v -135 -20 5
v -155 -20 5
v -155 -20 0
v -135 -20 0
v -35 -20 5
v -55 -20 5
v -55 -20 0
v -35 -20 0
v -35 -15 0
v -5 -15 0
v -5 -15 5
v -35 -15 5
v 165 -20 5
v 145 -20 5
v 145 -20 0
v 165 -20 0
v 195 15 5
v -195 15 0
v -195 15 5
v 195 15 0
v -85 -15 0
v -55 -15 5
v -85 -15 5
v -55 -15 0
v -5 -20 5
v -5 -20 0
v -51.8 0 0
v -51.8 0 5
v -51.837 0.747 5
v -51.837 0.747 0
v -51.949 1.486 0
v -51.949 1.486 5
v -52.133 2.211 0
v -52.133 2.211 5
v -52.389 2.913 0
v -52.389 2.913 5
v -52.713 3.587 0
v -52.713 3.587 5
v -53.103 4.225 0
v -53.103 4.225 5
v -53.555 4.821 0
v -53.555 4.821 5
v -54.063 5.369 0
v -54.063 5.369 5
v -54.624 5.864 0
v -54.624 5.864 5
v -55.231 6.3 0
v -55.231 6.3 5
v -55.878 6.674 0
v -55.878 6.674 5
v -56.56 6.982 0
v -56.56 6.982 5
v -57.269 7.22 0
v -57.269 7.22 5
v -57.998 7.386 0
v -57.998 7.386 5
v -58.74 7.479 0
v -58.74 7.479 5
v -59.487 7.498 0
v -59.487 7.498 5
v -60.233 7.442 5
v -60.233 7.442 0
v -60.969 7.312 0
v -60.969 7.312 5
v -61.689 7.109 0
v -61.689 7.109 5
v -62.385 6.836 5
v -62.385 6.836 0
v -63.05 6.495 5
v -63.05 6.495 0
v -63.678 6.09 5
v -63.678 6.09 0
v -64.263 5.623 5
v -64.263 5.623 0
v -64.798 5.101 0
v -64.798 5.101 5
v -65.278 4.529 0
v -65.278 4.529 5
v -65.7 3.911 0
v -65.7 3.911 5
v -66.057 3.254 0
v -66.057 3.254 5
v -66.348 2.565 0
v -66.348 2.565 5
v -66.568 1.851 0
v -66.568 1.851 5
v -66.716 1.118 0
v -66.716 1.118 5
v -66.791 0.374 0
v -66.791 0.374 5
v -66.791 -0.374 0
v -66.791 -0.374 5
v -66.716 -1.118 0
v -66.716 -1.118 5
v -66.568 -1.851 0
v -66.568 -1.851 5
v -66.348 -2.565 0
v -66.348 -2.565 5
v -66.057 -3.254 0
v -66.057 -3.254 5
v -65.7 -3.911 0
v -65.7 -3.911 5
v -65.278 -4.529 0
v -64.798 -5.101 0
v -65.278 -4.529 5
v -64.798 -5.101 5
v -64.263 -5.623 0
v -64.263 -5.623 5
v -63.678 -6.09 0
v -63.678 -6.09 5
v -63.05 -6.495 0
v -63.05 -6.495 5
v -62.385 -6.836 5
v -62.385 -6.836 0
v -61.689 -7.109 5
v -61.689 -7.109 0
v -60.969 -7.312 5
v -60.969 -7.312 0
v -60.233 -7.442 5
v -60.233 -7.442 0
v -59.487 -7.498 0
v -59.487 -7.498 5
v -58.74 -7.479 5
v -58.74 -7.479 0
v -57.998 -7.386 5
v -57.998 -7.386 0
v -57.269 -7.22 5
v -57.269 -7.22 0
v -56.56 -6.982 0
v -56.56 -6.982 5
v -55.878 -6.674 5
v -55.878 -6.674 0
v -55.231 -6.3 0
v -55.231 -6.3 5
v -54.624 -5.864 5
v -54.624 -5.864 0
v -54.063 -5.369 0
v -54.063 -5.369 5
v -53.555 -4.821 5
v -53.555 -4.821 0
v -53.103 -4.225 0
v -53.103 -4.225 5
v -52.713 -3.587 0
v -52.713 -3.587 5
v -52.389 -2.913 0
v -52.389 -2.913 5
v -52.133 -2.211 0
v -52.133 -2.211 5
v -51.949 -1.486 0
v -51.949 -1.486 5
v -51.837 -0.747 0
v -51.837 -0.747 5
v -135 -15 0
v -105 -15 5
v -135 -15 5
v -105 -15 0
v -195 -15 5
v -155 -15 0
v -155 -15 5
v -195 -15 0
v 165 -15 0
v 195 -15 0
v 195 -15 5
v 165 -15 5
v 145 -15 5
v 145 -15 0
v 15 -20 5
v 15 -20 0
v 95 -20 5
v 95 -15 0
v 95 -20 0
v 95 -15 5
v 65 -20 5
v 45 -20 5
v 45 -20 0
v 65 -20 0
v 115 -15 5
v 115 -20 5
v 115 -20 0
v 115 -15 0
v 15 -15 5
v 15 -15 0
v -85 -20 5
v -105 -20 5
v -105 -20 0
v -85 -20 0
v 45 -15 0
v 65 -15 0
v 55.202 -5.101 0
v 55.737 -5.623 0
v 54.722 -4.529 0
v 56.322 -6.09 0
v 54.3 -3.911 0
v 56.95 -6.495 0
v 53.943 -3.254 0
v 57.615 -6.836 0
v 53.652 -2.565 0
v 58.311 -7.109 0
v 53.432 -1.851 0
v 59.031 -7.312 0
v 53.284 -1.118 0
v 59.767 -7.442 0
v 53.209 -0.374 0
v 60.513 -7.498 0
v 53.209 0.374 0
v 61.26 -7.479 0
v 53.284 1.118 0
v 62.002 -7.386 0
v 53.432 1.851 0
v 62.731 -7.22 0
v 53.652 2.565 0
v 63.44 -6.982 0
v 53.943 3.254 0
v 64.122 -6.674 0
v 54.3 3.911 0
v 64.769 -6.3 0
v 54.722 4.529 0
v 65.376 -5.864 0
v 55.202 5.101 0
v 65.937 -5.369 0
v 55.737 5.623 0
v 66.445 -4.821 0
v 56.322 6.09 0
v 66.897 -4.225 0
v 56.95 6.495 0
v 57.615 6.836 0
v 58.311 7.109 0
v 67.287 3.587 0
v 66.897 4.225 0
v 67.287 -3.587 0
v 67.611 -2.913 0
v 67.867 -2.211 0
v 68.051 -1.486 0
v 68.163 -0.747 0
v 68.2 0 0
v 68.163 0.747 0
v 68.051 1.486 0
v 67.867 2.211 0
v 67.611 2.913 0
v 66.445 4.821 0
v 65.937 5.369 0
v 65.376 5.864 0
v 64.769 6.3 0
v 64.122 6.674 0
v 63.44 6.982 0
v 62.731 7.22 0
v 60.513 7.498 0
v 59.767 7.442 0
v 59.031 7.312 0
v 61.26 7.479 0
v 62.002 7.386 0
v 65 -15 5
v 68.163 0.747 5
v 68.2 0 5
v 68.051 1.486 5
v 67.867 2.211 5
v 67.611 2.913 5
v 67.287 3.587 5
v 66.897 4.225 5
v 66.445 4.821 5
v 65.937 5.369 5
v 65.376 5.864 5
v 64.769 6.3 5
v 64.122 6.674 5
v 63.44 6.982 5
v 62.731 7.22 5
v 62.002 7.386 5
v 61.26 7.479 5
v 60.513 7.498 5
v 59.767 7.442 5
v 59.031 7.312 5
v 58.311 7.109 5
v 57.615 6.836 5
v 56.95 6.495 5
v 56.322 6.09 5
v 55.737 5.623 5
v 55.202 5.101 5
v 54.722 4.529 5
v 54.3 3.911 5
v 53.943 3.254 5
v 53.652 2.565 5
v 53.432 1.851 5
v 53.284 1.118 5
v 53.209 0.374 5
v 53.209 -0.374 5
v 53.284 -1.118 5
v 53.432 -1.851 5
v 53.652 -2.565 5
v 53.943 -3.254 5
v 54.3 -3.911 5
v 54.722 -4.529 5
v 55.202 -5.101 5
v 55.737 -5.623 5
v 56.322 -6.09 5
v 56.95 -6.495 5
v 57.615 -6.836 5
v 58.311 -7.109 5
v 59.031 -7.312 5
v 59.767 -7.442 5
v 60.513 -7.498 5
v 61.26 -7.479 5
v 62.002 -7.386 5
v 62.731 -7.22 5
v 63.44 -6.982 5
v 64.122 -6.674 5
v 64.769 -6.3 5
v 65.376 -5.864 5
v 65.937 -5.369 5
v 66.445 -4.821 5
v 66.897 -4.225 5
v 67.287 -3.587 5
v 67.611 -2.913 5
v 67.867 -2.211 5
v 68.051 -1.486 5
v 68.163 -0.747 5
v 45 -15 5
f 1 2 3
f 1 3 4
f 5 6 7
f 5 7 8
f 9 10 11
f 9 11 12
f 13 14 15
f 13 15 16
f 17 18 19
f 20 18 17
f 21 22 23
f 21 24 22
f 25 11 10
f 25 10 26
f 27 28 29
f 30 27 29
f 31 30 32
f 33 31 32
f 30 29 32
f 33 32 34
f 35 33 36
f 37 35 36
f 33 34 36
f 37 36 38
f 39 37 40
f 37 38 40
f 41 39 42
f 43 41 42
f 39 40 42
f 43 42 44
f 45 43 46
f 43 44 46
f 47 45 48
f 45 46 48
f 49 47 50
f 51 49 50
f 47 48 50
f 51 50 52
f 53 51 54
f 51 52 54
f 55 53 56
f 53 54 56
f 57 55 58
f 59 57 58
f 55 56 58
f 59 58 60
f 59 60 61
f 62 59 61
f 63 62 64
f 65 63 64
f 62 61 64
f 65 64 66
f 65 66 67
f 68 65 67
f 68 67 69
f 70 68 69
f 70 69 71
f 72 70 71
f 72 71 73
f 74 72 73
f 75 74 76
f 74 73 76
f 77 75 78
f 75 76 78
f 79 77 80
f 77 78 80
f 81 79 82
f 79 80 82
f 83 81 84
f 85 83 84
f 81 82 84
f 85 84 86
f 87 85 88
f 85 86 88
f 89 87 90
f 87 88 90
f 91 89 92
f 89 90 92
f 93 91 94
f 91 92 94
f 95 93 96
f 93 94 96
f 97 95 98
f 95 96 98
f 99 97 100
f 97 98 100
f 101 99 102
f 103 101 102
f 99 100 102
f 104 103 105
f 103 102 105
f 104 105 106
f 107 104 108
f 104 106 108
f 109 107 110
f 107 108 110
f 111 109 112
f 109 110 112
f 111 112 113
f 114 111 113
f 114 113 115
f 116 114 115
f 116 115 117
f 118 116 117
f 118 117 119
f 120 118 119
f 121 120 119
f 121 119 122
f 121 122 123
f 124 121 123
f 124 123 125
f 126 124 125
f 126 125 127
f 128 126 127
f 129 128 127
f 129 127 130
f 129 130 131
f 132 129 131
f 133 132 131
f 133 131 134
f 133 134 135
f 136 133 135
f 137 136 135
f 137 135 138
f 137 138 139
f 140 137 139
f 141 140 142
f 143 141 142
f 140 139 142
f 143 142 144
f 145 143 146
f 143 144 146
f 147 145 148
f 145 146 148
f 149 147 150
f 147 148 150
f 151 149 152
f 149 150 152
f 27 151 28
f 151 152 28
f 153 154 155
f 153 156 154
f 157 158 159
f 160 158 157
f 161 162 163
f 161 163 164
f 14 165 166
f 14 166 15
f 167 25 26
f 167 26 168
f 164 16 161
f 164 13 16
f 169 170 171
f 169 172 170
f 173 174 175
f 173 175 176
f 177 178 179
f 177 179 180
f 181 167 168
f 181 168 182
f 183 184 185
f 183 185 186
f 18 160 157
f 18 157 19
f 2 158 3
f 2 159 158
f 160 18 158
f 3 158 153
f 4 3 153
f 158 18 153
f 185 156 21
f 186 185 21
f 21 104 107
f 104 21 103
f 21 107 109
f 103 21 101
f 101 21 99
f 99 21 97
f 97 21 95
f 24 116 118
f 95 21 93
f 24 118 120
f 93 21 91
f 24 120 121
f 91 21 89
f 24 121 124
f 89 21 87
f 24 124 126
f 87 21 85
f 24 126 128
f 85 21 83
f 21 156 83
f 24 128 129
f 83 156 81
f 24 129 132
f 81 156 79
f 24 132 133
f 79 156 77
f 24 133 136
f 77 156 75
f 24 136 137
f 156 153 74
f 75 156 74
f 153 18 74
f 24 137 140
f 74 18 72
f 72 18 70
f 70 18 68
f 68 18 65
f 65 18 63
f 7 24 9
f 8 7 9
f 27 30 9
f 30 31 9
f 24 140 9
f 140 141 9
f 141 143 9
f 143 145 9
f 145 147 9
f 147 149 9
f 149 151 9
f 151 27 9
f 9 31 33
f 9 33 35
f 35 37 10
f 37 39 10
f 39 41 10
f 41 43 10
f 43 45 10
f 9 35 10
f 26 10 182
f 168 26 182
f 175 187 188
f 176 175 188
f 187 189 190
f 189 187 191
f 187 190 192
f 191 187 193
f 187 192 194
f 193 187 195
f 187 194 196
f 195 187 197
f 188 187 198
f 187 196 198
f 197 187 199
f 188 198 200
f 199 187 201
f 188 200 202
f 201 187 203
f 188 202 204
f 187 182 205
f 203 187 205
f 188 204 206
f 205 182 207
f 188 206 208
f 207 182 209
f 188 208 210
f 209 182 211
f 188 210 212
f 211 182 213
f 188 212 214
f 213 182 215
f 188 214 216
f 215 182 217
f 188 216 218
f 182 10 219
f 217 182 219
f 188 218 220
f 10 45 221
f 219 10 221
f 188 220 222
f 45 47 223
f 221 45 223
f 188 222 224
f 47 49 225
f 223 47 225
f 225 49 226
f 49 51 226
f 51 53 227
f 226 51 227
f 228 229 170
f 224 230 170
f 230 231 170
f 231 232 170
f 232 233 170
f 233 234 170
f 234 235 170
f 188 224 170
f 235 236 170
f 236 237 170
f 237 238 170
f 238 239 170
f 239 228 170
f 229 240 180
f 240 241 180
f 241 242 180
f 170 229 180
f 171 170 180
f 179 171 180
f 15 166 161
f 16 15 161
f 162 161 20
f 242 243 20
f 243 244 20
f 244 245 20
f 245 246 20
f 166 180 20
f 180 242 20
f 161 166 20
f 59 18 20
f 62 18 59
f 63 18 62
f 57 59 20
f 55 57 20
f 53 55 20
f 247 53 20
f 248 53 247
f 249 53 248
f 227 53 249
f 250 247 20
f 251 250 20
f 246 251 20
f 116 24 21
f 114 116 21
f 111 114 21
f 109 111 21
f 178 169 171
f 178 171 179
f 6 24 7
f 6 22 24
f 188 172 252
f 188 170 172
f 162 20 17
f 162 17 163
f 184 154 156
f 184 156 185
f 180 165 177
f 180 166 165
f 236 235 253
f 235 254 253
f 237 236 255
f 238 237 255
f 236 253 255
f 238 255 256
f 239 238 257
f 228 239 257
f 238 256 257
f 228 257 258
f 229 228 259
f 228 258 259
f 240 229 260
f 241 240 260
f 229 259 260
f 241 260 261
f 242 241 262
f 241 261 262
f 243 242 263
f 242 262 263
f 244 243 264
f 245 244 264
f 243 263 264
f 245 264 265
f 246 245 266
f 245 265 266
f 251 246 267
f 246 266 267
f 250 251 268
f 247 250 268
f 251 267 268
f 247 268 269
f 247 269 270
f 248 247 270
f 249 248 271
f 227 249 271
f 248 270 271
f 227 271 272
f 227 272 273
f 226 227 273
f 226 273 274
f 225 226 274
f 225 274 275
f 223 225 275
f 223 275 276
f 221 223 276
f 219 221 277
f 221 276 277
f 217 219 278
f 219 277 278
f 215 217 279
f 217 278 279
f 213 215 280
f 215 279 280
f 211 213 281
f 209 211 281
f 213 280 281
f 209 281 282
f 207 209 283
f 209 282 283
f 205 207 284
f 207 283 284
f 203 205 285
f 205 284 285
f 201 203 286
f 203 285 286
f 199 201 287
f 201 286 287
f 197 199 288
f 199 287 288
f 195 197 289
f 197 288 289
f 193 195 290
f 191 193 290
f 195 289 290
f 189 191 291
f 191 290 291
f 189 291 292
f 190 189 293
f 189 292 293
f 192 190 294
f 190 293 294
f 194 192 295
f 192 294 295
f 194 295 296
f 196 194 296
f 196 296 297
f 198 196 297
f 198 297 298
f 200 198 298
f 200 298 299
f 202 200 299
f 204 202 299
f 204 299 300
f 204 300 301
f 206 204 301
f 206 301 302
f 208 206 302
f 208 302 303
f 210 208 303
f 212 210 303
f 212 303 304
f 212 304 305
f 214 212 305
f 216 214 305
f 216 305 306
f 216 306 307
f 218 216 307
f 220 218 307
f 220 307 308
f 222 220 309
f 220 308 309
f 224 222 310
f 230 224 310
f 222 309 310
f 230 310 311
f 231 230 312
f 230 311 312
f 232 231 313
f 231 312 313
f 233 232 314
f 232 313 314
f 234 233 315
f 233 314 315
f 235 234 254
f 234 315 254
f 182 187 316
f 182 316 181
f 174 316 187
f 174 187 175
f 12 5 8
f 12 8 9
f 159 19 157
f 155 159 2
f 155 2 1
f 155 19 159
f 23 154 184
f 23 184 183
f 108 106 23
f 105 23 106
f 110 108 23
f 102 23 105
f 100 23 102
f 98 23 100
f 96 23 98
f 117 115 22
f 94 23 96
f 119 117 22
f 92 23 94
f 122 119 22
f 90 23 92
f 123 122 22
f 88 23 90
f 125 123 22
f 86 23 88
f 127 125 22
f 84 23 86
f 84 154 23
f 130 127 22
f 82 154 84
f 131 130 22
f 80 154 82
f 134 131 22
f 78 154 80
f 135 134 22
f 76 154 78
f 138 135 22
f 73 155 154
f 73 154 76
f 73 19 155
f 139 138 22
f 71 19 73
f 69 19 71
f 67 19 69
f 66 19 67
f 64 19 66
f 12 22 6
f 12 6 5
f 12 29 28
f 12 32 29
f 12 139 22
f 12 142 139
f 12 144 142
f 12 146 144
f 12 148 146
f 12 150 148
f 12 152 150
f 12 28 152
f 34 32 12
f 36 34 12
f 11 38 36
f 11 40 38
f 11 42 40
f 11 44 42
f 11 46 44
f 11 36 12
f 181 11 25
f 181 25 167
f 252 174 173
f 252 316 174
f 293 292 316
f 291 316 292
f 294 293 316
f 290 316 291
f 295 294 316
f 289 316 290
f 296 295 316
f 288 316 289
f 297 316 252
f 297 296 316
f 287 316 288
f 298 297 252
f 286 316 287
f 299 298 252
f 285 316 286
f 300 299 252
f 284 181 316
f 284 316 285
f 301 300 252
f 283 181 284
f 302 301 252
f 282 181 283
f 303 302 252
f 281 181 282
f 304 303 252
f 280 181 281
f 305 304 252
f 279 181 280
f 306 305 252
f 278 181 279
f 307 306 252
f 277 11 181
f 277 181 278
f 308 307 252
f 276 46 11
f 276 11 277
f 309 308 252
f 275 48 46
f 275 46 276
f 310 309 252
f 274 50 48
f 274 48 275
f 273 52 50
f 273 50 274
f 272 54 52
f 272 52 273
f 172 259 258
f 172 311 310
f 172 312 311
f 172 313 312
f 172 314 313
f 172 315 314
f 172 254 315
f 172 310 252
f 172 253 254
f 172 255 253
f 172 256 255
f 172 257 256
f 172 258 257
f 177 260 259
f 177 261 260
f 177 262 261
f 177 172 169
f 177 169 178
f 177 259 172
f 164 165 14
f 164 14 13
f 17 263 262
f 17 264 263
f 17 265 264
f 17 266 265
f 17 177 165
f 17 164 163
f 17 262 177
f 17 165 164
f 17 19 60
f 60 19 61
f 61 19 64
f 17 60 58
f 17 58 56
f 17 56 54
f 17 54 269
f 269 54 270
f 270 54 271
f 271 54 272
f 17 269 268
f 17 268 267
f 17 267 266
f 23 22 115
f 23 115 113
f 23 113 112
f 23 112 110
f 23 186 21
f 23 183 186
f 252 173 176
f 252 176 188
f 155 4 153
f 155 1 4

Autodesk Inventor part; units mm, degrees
ref_plane "YZ Plane" through (0, 0, 0) normal (1, 0, 0) x (0, 1, 0)
ref_plane "XZ Plane" through (0, 0, 0) normal (0, 1, 0) x (-1, 0, 0)
ref_plane "XY Plane" through (0, 0, 0) normal (0, 0, 1) x (1, 0, 0)
sketch "Sketch1" plane through (0, 0, 0) normal (0, 0, 1) x (1, 0, 0)
  line L0 (-195, 15) -> (195, 15)
  line L1 (195, 15) -> (195, -15)
  line L2 (195, -15) -> (-195, -15)
  line L3 (-195, -15) -> (-195, 15)
  line L4 (-195, 15) -> (195, -15) construction
  line L5 (195, 15) -> (-195, -15) construction
  point P0 (0, 0)
  dimension "d0" = 390
  dimension "d1" = 30
extrude "Base" add sketch "Sketch1" along normal blind 5
sketch "Sketch3" plane through (0, 0, 5) normal (0, 0, 1) x (1, 0, 0)
  circle A0 centre (60.7, 0) radius 7.5
  circle A1 centre (-59.3, 0) radius 7.5
  line L0 (195, -15) -> (195, 15) projected
  dimension "d16" = 15
  dimension "d17" = 15
  dimension "d20" = 134.3
  dimension "d22" = 120
extrude "Extrusion3" cut sketch "Sketch3" against normal blind 10
sketch "Sketch4" plane through (0, 0, 5) normal (0, 0, 1) x (1, 0, 0)
  line L0 (-195, -15) -> (195, -15) projected
  line L1 (165, -15) -> (145, -15)
  line L2 (145, -15) -> (145, -20)
  line L3 (145, -20) -> (165, -20)
  line L4 (165, -20) -> (165, -15)
  line L5 (115, -15) -> (95, -15)
  line L6 (95, -15) -> (95, -20)
  line L7 (95, -20) -> (115, -20)
  line L8 (115, -20) -> (115, -15)
  line L9 (65, -15) -> (45, -15)
  line L10 (45, -15) -> (45, -20)
  line L11 (45, -20) -> (65, -20)
  line L12 (65, -20) -> (65, -15)
  line L13 (15, -15) -> (-5, -15)
  line L14 (-5, -15) -> (-5, -20)
  line L15 (-5, -20) -> (15, -20)
  line L16 (15, -20) -> (15, -15)
  line L17 (-35, -15) -> (-55, -15)
  line L18 (-55, -15) -> (-55, -20)
  line L19 (-55, -20) -> (-35, -20)
  line L20 (-35, -20) -> (-35, -15)
  line L21 (-85, -15) -> (-105, -15)
  line L22 (-105, -15) -> (-105, -20)
  line L23 (-105, -20) -> (-85, -20)
  line L24 (-85, -20) -> (-85, -15)
  line L25 (-135, -15) -> (-155, -15)
  line L26 (-155, -15) -> (-155, -20)
  line L27 (-155, -20) -> (-135, -20)
  line L28 (-135, -20) -> (-135, -15)
  point P0 (0, 0)
  point P1 (-35, -15)
  point P2 (-55, -15)
  point P3 (-135, -15)
  point P4 (-155, -15)
  point P5 (115, -15)
  point P6 (95, -15)
  point P7 (-85, -15)
  point P8 (-105, -15)
  point P9 (65, -15)
  point P10 (45, -15)
  point P11 (15, -15)
  point P12 (-5, -15)
  point P13 (145, -15)
  dimension "d23" = 20
  dimension "d24" = 5
  dimension "d25" = 30
  dimension "d28" = 50
extrude "Extrusion4" add sketch "Sketch4" against normal blind 5
properties part number "Divisória-30cm c rolamento"
